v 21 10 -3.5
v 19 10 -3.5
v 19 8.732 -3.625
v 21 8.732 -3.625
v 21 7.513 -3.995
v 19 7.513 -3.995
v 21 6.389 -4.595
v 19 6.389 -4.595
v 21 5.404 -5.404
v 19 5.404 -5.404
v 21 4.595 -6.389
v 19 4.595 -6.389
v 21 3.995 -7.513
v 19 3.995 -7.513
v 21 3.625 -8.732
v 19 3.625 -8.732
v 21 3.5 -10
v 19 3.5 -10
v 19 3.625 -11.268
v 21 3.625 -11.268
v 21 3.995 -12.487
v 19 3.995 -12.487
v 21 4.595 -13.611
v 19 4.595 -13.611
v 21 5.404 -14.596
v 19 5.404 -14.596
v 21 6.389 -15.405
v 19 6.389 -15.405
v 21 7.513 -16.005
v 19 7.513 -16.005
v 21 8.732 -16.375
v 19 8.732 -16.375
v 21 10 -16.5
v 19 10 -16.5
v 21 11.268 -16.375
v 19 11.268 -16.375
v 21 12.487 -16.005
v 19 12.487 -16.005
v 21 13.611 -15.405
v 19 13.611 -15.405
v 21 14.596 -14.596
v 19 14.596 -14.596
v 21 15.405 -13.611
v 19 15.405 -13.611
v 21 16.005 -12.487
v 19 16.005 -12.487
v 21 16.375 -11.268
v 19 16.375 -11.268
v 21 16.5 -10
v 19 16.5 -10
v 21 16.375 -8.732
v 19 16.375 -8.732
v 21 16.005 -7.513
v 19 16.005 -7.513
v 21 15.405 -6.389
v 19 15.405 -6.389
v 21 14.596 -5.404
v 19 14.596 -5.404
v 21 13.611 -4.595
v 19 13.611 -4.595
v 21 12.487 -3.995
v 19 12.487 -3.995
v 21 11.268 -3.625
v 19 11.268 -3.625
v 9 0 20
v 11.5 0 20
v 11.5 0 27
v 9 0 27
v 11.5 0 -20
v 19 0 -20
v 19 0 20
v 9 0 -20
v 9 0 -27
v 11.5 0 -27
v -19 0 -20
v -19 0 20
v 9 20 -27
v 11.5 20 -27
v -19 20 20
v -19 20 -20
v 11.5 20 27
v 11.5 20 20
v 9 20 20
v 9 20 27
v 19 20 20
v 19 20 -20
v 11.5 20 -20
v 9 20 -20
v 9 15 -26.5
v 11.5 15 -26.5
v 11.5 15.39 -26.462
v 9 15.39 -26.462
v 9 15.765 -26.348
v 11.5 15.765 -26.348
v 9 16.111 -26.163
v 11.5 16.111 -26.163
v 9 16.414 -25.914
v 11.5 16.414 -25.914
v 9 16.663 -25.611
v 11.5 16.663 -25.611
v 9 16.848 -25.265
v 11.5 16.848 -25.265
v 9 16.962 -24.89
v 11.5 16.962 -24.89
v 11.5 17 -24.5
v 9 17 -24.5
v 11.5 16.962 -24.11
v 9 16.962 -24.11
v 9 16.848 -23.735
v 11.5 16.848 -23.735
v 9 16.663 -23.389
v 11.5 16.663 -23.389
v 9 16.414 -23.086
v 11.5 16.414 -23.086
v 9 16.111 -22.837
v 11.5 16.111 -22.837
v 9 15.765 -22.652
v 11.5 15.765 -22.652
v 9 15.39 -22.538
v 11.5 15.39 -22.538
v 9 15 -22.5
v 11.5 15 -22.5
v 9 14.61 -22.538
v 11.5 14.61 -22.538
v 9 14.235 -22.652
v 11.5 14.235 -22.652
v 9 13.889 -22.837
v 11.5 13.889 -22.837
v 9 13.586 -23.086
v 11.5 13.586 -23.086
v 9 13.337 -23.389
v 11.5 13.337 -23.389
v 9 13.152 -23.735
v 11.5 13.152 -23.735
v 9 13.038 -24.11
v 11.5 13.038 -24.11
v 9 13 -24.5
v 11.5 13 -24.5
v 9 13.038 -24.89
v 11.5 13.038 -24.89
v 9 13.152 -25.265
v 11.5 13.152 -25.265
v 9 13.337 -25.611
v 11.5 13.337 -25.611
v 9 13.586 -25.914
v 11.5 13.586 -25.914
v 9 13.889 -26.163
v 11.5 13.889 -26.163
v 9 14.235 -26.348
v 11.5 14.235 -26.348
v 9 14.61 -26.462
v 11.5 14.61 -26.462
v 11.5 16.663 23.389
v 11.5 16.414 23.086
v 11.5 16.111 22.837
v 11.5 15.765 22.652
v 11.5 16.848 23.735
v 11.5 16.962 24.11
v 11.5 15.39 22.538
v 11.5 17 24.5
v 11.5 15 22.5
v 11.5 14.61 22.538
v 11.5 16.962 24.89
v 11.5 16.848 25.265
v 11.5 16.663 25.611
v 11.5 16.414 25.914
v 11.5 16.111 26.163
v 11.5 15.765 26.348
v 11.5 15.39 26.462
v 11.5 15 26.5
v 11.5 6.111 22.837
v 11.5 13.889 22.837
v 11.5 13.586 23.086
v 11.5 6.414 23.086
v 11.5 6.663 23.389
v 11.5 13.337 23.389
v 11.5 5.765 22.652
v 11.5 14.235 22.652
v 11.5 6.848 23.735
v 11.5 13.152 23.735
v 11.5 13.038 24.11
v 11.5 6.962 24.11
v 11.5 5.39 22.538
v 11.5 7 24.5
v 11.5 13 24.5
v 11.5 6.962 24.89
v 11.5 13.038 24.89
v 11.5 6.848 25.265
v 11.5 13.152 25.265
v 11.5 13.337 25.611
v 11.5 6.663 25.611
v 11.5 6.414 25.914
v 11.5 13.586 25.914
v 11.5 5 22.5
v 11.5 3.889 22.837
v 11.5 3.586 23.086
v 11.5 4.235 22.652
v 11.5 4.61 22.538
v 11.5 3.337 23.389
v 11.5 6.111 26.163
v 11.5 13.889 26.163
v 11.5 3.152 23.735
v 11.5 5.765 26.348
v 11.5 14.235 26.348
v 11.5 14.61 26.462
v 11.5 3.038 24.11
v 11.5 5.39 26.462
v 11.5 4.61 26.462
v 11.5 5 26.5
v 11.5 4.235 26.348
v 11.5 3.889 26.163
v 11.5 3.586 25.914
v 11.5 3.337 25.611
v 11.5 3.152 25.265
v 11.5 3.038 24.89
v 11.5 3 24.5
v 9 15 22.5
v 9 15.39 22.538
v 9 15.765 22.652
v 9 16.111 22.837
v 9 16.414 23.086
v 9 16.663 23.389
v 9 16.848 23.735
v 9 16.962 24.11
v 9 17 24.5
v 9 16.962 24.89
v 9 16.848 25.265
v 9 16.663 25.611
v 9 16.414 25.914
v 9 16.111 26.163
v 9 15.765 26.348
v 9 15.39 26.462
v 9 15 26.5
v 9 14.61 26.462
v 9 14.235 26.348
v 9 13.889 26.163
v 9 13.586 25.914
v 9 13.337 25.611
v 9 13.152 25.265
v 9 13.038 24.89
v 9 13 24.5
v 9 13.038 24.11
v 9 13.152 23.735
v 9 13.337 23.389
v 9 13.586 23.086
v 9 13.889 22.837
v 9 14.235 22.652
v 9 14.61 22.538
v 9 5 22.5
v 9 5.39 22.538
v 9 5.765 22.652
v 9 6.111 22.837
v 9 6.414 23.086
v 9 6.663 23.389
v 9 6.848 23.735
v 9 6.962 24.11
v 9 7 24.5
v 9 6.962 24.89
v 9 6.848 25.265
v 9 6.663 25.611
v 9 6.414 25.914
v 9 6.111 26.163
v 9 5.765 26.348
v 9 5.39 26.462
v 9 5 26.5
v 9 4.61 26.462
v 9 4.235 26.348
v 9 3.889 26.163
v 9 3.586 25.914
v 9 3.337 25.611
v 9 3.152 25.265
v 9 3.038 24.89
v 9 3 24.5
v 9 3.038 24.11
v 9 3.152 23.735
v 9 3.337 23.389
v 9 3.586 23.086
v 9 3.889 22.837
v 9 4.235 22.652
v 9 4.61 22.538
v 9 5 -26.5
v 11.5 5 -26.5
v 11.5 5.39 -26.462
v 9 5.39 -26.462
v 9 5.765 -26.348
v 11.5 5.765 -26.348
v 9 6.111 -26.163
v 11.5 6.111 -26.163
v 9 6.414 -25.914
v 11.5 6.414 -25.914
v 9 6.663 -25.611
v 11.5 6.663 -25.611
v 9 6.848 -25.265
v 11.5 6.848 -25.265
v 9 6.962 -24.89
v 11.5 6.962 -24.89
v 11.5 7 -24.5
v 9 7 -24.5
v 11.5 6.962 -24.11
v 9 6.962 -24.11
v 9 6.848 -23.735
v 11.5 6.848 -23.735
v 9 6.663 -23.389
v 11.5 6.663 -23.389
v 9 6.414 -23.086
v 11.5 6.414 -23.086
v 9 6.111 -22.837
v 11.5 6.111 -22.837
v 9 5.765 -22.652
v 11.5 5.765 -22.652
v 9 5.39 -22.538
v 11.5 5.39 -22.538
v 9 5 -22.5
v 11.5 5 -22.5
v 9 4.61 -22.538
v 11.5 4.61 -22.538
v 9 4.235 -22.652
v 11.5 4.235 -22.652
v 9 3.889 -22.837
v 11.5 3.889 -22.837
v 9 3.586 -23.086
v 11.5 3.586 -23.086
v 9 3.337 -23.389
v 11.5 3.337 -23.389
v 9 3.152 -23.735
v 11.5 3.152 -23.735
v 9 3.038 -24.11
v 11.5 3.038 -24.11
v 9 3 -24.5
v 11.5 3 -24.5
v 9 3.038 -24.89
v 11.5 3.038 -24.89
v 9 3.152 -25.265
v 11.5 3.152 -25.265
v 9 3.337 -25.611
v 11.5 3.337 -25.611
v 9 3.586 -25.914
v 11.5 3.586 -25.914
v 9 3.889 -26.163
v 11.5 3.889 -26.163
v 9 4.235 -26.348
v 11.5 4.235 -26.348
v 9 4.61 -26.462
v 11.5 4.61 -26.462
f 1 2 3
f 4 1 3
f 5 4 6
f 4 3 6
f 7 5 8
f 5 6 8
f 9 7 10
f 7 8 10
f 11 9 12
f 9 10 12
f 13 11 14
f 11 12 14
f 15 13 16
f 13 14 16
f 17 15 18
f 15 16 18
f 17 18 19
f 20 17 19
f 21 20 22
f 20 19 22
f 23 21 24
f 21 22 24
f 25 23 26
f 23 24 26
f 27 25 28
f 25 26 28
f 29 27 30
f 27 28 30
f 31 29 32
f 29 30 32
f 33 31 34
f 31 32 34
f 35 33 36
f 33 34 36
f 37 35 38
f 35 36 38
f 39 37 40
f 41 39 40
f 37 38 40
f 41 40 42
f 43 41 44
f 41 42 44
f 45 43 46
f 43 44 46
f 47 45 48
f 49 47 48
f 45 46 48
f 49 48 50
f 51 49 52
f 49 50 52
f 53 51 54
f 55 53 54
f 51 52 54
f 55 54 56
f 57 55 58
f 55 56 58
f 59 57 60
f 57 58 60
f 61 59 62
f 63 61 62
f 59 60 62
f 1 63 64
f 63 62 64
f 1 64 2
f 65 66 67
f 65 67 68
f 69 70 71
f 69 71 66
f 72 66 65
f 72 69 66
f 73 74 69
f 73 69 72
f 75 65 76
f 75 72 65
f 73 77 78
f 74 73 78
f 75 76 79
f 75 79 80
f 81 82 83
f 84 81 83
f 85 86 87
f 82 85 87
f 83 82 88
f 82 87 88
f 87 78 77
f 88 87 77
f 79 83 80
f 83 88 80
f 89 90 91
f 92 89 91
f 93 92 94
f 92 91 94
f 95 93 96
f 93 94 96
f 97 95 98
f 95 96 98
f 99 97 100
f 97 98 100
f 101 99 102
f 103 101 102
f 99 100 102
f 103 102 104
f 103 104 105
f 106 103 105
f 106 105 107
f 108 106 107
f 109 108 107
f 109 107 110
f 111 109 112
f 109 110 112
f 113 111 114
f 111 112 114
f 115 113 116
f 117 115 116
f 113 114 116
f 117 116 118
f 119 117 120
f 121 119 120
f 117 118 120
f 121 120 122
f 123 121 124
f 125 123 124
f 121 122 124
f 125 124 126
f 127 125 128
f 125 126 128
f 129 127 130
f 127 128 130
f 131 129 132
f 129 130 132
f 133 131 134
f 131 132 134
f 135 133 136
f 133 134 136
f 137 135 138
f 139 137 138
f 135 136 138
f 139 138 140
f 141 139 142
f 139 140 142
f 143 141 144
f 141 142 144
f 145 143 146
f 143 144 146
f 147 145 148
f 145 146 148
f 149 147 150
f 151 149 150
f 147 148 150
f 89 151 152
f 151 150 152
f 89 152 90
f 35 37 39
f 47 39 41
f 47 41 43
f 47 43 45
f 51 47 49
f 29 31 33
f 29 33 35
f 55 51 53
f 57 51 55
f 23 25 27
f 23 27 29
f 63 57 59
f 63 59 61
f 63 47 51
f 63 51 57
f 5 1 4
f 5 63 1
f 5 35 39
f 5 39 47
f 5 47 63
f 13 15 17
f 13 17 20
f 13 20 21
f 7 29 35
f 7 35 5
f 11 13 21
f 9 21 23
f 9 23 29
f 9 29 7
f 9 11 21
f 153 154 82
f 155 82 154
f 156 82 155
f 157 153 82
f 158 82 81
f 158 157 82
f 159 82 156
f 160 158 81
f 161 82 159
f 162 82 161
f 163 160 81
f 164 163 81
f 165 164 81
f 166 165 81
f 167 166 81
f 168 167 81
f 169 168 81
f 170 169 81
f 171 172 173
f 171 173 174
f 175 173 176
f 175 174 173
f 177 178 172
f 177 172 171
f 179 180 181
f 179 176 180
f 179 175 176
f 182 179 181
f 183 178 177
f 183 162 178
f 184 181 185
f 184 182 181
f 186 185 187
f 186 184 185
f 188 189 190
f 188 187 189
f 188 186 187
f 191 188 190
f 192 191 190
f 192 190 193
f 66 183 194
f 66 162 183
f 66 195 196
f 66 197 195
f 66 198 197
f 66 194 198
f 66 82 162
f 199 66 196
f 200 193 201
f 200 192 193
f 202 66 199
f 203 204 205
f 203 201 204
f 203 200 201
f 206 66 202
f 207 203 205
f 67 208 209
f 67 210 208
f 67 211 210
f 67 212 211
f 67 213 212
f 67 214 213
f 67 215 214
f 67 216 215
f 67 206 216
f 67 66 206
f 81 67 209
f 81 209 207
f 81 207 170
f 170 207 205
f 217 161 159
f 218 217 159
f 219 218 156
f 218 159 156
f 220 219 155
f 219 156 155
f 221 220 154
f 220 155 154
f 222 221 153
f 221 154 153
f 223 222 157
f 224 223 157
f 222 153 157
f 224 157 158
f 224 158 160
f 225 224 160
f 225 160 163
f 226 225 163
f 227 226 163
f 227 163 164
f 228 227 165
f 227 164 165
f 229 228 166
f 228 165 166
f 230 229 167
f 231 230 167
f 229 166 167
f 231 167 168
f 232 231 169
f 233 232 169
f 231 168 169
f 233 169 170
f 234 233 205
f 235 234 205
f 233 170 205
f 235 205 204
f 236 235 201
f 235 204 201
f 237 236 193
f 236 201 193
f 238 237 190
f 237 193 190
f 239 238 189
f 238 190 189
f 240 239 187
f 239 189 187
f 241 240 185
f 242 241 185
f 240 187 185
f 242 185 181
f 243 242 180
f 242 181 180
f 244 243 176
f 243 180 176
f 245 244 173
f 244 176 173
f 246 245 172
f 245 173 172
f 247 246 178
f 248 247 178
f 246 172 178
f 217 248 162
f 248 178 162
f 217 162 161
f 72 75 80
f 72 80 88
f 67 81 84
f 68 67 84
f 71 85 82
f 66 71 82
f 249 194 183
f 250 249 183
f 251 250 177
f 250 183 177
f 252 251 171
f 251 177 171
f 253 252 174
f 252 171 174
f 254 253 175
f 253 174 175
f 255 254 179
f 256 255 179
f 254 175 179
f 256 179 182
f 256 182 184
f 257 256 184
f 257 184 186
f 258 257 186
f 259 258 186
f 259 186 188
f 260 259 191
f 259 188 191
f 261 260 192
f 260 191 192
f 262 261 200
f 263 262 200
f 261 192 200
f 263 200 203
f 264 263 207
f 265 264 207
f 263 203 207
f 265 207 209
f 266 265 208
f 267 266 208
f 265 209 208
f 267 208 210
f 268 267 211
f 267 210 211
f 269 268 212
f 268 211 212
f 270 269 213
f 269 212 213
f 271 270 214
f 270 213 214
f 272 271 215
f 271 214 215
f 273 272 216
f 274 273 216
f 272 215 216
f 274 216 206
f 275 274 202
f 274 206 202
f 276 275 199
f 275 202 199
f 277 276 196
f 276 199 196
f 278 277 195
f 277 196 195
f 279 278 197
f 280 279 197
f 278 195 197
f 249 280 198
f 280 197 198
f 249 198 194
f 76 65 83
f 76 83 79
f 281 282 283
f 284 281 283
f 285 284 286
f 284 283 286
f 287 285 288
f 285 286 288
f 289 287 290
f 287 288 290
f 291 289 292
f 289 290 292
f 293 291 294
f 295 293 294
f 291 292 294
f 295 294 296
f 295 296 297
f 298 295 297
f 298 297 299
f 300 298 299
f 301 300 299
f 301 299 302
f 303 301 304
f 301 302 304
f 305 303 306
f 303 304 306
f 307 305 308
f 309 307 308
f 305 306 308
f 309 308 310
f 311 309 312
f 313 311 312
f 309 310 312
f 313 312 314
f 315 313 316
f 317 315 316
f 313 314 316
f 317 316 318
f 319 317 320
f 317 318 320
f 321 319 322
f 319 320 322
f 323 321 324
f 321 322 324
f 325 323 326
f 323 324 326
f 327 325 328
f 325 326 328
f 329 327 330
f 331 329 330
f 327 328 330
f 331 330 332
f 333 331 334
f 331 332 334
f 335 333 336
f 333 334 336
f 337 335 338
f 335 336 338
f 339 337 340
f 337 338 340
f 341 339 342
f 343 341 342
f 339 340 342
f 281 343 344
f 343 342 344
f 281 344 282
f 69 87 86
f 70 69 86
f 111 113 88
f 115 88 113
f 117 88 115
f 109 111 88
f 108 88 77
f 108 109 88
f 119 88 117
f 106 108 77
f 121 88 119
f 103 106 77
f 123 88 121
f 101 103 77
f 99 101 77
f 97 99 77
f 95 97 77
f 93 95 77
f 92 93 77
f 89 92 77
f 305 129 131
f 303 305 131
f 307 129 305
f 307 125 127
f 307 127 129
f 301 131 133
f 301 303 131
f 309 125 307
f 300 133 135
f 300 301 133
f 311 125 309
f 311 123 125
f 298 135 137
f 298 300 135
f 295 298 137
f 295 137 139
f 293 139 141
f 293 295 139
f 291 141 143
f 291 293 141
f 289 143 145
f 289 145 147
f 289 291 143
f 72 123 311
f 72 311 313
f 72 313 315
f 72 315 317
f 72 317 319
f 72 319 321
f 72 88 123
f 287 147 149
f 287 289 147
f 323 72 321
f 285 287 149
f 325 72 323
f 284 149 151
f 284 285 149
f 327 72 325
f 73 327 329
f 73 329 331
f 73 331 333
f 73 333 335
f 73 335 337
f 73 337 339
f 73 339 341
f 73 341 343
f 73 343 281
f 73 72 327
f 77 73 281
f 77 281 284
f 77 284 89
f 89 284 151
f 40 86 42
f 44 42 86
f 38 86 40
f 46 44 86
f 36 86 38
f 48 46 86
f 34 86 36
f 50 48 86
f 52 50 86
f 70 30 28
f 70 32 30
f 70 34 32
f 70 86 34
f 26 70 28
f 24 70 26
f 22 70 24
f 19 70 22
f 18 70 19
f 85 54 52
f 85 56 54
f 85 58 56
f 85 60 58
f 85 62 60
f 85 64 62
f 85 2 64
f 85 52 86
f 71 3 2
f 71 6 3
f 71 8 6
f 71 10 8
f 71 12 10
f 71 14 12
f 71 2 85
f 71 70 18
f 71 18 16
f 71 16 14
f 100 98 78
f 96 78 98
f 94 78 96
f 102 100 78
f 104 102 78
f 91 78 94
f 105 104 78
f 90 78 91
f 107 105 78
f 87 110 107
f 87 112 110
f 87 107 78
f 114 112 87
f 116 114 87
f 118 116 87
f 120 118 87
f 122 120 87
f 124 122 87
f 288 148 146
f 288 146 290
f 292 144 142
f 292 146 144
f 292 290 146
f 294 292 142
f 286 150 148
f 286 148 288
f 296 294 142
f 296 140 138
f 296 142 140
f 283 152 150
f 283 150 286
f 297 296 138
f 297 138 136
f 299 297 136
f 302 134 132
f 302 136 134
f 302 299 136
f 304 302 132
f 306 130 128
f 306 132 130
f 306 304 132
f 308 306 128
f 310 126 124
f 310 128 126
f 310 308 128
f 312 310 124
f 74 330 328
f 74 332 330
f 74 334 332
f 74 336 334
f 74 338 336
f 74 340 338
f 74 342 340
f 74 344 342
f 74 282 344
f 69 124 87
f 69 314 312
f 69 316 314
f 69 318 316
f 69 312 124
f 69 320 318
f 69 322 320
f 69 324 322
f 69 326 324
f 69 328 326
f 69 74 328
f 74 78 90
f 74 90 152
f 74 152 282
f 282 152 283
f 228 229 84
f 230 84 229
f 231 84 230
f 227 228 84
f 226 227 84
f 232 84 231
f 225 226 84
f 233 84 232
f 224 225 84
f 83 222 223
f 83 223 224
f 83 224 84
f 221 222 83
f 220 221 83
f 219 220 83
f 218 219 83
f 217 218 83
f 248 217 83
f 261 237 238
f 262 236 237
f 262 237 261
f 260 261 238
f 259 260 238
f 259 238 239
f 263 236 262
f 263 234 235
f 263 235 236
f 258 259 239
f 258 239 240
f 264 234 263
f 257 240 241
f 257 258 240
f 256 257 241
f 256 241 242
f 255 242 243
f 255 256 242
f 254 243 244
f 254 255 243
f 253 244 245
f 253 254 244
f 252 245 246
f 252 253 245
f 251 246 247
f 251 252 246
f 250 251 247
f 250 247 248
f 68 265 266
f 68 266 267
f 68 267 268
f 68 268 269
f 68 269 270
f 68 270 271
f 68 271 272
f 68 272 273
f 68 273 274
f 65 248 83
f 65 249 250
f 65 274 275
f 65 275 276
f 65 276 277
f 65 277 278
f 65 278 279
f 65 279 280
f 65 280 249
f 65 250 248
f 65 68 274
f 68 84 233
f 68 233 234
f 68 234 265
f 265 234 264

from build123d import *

# Parameters (mm, degrees)
BOSS_EXTRUDE1_DEPTH = 20
SKETCH2_R           = 2
CUT_EXTRUDE1_DEPTH  = 2.5
SKETCH3_R           = 6.5
BOSS_EXTRUDE2_DEPTH = 2


with BuildPart() as part:
    # Sketch1 → Boss-Extrude1 (new body)
    with BuildSketch(Plane(origin=(0, 0, 0), x_dir=(1, 0, 0), z_dir=(0, 1, 0))):
        Polygon((11.5, 20), (19, 20), (19, -20), (11.5, -20), (11.5, -27), (9, -27), (9, -20), (-19, -20), (-19, 20), (9, 20), (9, 27), (11.5, 27), align=None)
    extrude(amount=BOSS_EXTRUDE1_DEPTH)

    # Sketch2 → Cut-Extrude1 (cut)
    with BuildSketch(Plane(origin=(11.5, 0, 0), x_dir=(0, 0, -1), z_dir=(1, 0, 0))):
        with Locations((-24.5, 15)):
            Circle(SKETCH2_R)
        with Locations((-24.5, 5)):
            Circle(SKETCH2_R)
        with Locations((24.5, 5)):
            Circle(SKETCH2_R)
        with Locations((24.5, 15)):
            Circle(SKETCH2_R)
    extrude(amount=-CUT_EXTRUDE1_DEPTH, mode=Mode.SUBTRACT)

    # Sketch3 → Boss-Extrude2 (add)
    with BuildSketch(Plane(origin=(19, 0, 0), x_dir=(0, 0, -1), z_dir=(1, 0, 0))):
        with Locations(Location((10, 10, 0), (0, 0, 180))):
            Circle(SKETCH3_R)
    extrude(amount=BOSS_EXTRUDE2_DEPTH)


solid = part.part
